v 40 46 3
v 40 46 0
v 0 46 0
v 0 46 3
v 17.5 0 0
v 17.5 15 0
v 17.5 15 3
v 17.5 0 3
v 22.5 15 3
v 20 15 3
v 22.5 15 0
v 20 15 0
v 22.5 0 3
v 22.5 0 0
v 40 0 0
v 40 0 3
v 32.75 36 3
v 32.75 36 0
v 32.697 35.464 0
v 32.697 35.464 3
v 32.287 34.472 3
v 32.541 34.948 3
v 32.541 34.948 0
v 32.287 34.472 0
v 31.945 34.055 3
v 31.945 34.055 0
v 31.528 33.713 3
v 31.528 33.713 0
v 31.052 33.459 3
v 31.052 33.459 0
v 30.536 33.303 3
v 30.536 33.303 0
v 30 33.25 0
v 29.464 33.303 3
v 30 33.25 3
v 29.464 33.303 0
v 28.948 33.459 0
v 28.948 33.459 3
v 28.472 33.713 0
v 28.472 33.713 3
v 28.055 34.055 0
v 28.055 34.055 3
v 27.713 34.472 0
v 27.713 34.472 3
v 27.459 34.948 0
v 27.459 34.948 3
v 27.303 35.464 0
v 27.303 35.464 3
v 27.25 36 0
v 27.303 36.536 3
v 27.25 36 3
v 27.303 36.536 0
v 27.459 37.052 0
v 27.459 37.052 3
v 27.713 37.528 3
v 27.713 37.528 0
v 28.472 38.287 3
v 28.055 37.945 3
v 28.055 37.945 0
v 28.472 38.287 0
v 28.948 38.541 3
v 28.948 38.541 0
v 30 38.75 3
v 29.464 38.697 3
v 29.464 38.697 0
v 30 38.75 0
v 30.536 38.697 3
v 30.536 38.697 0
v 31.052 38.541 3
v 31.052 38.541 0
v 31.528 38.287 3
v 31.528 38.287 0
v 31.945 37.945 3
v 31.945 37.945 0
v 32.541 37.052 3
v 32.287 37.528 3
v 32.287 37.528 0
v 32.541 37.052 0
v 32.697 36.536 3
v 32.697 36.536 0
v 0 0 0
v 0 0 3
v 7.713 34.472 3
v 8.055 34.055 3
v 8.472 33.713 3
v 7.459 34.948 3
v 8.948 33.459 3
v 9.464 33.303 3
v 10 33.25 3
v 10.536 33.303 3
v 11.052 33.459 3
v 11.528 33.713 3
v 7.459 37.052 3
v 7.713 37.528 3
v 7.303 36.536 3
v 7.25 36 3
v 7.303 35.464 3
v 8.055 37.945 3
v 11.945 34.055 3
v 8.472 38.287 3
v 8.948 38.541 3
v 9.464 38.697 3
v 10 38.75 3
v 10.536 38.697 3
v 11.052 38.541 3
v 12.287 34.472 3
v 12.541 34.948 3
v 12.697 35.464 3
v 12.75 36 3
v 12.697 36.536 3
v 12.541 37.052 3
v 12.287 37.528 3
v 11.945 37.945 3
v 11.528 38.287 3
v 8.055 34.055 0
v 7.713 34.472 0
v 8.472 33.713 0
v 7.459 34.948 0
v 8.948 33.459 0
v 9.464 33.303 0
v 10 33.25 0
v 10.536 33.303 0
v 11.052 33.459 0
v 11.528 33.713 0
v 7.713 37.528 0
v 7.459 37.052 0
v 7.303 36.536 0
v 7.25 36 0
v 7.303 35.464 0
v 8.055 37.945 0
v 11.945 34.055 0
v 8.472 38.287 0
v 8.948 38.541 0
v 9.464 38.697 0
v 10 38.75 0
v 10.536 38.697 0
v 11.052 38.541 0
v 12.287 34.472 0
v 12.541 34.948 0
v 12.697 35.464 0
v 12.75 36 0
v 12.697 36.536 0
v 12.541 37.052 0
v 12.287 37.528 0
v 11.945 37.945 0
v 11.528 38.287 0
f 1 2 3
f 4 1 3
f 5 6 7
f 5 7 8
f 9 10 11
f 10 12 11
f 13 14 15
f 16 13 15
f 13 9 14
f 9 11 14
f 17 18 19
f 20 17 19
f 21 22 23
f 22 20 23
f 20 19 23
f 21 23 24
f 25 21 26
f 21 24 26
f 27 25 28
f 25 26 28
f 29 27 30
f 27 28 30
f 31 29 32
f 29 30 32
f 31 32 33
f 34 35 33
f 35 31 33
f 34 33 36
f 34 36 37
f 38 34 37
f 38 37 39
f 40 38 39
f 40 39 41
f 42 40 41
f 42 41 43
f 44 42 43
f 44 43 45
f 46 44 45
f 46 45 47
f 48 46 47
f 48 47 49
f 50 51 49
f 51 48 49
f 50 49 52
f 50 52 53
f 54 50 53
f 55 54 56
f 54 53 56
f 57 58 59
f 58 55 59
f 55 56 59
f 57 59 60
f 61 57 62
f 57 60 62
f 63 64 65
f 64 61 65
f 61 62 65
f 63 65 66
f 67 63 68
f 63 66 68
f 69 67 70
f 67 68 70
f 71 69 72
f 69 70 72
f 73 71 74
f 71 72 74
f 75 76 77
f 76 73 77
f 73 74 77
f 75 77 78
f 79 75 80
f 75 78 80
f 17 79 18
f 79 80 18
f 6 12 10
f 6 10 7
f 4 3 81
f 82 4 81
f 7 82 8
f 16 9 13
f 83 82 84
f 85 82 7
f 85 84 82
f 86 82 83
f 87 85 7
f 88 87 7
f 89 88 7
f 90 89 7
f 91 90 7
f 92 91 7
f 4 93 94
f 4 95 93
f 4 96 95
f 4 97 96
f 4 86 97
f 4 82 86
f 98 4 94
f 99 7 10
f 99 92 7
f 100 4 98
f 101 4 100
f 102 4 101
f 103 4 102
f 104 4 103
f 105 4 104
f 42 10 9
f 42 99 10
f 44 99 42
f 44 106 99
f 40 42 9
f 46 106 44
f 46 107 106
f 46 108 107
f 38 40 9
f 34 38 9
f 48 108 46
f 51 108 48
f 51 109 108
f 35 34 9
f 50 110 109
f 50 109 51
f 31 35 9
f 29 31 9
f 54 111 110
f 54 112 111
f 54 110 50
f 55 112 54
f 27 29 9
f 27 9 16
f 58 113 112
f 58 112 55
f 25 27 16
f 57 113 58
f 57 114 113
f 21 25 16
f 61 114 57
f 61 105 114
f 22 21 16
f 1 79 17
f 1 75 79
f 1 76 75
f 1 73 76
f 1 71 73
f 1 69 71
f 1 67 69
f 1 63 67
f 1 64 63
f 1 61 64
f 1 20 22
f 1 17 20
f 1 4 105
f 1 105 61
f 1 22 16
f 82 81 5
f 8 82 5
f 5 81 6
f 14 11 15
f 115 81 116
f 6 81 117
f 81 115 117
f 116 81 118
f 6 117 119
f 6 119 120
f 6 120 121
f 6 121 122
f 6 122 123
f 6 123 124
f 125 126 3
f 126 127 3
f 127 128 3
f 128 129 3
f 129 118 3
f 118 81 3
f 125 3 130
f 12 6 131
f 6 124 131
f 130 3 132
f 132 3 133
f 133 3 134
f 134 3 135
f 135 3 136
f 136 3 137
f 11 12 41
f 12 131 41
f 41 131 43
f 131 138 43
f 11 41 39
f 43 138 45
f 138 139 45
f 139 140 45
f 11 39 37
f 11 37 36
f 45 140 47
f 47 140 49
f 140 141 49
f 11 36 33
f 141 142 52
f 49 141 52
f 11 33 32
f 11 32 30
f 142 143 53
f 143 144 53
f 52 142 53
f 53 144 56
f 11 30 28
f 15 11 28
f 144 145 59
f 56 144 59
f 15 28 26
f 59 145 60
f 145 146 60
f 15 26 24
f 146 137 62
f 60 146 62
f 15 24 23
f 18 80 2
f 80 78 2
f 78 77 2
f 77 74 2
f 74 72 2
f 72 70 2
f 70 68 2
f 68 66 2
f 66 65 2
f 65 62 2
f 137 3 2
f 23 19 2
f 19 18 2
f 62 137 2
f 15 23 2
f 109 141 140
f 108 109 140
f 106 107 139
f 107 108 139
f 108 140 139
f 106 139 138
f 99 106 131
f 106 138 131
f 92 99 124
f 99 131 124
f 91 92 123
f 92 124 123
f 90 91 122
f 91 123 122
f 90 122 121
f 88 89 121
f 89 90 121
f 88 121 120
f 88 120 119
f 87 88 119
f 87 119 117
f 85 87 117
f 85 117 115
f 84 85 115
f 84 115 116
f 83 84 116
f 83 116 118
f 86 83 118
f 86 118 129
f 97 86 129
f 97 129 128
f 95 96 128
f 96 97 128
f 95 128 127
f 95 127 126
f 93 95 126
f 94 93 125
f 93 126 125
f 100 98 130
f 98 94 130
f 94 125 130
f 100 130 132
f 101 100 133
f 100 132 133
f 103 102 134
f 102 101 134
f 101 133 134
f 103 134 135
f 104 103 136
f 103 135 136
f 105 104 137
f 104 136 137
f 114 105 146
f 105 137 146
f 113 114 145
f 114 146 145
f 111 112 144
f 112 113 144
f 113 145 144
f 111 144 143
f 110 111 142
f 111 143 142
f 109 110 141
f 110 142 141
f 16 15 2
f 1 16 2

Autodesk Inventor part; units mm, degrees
ref_plane "YZ Plane" through (0, 0, 0) normal (1, 0, 0) x (0, 1, 0)
ref_plane "XZ Plane" through (0, 0, 0) normal (0, 1, 0) x (-1, 0, 0)
ref_plane "XY Plane" through (0, 0, 0) normal (0, 0, 1) x (1, 0, 0)
sketch "Sketch1" plane through (0, 0, 0) normal (0, 0, 1) x (1, 0, 0)
  line L0 (0, 0) -> (40, 0)
  line L1 (40, 0) -> (40, 46)
  line L2 (40, 46) -> (0, 46)
  line L3 (0, 46) -> (0, 0)
  line L4 (20, 0) -> (20, 15) construction
  line L5 (20, 15) -> (22.5, 15)
  line L6 (22.5, 15) -> (22.5, 0)
  line L7 (20, 15) -> (17.5, 15)
  line L8 (17.5, 15) -> (17.5, 0)
  line L9 (0, 46) -> (0, 36) construction
  line L10 (0, 36) -> (10, 36) construction
  circle A0 centre (10, 36) radius 2.75
  line L11 (40, 36) -> (30, 36) construction
  circle A1 centre (30, 36) radius 2.75
  dimension "d0" = 40
  dimension "d1" = 46
  dimension "d2" = 15
  dimension "d3" = 2.5
  dimension "d4" = 2.5
  dimension "d5" = 10
  dimension "d6" = 10
  dimension "d7" = 5.5
  dimension "d8" = 10
  dimension "d9" = 5.5
extrude "Extrusion1" add sketch "Sketch1" along normal blind 3 contours L3 L2 L1 L0 L6 L5 L7 L8
properties part number "Camera_Mount"
